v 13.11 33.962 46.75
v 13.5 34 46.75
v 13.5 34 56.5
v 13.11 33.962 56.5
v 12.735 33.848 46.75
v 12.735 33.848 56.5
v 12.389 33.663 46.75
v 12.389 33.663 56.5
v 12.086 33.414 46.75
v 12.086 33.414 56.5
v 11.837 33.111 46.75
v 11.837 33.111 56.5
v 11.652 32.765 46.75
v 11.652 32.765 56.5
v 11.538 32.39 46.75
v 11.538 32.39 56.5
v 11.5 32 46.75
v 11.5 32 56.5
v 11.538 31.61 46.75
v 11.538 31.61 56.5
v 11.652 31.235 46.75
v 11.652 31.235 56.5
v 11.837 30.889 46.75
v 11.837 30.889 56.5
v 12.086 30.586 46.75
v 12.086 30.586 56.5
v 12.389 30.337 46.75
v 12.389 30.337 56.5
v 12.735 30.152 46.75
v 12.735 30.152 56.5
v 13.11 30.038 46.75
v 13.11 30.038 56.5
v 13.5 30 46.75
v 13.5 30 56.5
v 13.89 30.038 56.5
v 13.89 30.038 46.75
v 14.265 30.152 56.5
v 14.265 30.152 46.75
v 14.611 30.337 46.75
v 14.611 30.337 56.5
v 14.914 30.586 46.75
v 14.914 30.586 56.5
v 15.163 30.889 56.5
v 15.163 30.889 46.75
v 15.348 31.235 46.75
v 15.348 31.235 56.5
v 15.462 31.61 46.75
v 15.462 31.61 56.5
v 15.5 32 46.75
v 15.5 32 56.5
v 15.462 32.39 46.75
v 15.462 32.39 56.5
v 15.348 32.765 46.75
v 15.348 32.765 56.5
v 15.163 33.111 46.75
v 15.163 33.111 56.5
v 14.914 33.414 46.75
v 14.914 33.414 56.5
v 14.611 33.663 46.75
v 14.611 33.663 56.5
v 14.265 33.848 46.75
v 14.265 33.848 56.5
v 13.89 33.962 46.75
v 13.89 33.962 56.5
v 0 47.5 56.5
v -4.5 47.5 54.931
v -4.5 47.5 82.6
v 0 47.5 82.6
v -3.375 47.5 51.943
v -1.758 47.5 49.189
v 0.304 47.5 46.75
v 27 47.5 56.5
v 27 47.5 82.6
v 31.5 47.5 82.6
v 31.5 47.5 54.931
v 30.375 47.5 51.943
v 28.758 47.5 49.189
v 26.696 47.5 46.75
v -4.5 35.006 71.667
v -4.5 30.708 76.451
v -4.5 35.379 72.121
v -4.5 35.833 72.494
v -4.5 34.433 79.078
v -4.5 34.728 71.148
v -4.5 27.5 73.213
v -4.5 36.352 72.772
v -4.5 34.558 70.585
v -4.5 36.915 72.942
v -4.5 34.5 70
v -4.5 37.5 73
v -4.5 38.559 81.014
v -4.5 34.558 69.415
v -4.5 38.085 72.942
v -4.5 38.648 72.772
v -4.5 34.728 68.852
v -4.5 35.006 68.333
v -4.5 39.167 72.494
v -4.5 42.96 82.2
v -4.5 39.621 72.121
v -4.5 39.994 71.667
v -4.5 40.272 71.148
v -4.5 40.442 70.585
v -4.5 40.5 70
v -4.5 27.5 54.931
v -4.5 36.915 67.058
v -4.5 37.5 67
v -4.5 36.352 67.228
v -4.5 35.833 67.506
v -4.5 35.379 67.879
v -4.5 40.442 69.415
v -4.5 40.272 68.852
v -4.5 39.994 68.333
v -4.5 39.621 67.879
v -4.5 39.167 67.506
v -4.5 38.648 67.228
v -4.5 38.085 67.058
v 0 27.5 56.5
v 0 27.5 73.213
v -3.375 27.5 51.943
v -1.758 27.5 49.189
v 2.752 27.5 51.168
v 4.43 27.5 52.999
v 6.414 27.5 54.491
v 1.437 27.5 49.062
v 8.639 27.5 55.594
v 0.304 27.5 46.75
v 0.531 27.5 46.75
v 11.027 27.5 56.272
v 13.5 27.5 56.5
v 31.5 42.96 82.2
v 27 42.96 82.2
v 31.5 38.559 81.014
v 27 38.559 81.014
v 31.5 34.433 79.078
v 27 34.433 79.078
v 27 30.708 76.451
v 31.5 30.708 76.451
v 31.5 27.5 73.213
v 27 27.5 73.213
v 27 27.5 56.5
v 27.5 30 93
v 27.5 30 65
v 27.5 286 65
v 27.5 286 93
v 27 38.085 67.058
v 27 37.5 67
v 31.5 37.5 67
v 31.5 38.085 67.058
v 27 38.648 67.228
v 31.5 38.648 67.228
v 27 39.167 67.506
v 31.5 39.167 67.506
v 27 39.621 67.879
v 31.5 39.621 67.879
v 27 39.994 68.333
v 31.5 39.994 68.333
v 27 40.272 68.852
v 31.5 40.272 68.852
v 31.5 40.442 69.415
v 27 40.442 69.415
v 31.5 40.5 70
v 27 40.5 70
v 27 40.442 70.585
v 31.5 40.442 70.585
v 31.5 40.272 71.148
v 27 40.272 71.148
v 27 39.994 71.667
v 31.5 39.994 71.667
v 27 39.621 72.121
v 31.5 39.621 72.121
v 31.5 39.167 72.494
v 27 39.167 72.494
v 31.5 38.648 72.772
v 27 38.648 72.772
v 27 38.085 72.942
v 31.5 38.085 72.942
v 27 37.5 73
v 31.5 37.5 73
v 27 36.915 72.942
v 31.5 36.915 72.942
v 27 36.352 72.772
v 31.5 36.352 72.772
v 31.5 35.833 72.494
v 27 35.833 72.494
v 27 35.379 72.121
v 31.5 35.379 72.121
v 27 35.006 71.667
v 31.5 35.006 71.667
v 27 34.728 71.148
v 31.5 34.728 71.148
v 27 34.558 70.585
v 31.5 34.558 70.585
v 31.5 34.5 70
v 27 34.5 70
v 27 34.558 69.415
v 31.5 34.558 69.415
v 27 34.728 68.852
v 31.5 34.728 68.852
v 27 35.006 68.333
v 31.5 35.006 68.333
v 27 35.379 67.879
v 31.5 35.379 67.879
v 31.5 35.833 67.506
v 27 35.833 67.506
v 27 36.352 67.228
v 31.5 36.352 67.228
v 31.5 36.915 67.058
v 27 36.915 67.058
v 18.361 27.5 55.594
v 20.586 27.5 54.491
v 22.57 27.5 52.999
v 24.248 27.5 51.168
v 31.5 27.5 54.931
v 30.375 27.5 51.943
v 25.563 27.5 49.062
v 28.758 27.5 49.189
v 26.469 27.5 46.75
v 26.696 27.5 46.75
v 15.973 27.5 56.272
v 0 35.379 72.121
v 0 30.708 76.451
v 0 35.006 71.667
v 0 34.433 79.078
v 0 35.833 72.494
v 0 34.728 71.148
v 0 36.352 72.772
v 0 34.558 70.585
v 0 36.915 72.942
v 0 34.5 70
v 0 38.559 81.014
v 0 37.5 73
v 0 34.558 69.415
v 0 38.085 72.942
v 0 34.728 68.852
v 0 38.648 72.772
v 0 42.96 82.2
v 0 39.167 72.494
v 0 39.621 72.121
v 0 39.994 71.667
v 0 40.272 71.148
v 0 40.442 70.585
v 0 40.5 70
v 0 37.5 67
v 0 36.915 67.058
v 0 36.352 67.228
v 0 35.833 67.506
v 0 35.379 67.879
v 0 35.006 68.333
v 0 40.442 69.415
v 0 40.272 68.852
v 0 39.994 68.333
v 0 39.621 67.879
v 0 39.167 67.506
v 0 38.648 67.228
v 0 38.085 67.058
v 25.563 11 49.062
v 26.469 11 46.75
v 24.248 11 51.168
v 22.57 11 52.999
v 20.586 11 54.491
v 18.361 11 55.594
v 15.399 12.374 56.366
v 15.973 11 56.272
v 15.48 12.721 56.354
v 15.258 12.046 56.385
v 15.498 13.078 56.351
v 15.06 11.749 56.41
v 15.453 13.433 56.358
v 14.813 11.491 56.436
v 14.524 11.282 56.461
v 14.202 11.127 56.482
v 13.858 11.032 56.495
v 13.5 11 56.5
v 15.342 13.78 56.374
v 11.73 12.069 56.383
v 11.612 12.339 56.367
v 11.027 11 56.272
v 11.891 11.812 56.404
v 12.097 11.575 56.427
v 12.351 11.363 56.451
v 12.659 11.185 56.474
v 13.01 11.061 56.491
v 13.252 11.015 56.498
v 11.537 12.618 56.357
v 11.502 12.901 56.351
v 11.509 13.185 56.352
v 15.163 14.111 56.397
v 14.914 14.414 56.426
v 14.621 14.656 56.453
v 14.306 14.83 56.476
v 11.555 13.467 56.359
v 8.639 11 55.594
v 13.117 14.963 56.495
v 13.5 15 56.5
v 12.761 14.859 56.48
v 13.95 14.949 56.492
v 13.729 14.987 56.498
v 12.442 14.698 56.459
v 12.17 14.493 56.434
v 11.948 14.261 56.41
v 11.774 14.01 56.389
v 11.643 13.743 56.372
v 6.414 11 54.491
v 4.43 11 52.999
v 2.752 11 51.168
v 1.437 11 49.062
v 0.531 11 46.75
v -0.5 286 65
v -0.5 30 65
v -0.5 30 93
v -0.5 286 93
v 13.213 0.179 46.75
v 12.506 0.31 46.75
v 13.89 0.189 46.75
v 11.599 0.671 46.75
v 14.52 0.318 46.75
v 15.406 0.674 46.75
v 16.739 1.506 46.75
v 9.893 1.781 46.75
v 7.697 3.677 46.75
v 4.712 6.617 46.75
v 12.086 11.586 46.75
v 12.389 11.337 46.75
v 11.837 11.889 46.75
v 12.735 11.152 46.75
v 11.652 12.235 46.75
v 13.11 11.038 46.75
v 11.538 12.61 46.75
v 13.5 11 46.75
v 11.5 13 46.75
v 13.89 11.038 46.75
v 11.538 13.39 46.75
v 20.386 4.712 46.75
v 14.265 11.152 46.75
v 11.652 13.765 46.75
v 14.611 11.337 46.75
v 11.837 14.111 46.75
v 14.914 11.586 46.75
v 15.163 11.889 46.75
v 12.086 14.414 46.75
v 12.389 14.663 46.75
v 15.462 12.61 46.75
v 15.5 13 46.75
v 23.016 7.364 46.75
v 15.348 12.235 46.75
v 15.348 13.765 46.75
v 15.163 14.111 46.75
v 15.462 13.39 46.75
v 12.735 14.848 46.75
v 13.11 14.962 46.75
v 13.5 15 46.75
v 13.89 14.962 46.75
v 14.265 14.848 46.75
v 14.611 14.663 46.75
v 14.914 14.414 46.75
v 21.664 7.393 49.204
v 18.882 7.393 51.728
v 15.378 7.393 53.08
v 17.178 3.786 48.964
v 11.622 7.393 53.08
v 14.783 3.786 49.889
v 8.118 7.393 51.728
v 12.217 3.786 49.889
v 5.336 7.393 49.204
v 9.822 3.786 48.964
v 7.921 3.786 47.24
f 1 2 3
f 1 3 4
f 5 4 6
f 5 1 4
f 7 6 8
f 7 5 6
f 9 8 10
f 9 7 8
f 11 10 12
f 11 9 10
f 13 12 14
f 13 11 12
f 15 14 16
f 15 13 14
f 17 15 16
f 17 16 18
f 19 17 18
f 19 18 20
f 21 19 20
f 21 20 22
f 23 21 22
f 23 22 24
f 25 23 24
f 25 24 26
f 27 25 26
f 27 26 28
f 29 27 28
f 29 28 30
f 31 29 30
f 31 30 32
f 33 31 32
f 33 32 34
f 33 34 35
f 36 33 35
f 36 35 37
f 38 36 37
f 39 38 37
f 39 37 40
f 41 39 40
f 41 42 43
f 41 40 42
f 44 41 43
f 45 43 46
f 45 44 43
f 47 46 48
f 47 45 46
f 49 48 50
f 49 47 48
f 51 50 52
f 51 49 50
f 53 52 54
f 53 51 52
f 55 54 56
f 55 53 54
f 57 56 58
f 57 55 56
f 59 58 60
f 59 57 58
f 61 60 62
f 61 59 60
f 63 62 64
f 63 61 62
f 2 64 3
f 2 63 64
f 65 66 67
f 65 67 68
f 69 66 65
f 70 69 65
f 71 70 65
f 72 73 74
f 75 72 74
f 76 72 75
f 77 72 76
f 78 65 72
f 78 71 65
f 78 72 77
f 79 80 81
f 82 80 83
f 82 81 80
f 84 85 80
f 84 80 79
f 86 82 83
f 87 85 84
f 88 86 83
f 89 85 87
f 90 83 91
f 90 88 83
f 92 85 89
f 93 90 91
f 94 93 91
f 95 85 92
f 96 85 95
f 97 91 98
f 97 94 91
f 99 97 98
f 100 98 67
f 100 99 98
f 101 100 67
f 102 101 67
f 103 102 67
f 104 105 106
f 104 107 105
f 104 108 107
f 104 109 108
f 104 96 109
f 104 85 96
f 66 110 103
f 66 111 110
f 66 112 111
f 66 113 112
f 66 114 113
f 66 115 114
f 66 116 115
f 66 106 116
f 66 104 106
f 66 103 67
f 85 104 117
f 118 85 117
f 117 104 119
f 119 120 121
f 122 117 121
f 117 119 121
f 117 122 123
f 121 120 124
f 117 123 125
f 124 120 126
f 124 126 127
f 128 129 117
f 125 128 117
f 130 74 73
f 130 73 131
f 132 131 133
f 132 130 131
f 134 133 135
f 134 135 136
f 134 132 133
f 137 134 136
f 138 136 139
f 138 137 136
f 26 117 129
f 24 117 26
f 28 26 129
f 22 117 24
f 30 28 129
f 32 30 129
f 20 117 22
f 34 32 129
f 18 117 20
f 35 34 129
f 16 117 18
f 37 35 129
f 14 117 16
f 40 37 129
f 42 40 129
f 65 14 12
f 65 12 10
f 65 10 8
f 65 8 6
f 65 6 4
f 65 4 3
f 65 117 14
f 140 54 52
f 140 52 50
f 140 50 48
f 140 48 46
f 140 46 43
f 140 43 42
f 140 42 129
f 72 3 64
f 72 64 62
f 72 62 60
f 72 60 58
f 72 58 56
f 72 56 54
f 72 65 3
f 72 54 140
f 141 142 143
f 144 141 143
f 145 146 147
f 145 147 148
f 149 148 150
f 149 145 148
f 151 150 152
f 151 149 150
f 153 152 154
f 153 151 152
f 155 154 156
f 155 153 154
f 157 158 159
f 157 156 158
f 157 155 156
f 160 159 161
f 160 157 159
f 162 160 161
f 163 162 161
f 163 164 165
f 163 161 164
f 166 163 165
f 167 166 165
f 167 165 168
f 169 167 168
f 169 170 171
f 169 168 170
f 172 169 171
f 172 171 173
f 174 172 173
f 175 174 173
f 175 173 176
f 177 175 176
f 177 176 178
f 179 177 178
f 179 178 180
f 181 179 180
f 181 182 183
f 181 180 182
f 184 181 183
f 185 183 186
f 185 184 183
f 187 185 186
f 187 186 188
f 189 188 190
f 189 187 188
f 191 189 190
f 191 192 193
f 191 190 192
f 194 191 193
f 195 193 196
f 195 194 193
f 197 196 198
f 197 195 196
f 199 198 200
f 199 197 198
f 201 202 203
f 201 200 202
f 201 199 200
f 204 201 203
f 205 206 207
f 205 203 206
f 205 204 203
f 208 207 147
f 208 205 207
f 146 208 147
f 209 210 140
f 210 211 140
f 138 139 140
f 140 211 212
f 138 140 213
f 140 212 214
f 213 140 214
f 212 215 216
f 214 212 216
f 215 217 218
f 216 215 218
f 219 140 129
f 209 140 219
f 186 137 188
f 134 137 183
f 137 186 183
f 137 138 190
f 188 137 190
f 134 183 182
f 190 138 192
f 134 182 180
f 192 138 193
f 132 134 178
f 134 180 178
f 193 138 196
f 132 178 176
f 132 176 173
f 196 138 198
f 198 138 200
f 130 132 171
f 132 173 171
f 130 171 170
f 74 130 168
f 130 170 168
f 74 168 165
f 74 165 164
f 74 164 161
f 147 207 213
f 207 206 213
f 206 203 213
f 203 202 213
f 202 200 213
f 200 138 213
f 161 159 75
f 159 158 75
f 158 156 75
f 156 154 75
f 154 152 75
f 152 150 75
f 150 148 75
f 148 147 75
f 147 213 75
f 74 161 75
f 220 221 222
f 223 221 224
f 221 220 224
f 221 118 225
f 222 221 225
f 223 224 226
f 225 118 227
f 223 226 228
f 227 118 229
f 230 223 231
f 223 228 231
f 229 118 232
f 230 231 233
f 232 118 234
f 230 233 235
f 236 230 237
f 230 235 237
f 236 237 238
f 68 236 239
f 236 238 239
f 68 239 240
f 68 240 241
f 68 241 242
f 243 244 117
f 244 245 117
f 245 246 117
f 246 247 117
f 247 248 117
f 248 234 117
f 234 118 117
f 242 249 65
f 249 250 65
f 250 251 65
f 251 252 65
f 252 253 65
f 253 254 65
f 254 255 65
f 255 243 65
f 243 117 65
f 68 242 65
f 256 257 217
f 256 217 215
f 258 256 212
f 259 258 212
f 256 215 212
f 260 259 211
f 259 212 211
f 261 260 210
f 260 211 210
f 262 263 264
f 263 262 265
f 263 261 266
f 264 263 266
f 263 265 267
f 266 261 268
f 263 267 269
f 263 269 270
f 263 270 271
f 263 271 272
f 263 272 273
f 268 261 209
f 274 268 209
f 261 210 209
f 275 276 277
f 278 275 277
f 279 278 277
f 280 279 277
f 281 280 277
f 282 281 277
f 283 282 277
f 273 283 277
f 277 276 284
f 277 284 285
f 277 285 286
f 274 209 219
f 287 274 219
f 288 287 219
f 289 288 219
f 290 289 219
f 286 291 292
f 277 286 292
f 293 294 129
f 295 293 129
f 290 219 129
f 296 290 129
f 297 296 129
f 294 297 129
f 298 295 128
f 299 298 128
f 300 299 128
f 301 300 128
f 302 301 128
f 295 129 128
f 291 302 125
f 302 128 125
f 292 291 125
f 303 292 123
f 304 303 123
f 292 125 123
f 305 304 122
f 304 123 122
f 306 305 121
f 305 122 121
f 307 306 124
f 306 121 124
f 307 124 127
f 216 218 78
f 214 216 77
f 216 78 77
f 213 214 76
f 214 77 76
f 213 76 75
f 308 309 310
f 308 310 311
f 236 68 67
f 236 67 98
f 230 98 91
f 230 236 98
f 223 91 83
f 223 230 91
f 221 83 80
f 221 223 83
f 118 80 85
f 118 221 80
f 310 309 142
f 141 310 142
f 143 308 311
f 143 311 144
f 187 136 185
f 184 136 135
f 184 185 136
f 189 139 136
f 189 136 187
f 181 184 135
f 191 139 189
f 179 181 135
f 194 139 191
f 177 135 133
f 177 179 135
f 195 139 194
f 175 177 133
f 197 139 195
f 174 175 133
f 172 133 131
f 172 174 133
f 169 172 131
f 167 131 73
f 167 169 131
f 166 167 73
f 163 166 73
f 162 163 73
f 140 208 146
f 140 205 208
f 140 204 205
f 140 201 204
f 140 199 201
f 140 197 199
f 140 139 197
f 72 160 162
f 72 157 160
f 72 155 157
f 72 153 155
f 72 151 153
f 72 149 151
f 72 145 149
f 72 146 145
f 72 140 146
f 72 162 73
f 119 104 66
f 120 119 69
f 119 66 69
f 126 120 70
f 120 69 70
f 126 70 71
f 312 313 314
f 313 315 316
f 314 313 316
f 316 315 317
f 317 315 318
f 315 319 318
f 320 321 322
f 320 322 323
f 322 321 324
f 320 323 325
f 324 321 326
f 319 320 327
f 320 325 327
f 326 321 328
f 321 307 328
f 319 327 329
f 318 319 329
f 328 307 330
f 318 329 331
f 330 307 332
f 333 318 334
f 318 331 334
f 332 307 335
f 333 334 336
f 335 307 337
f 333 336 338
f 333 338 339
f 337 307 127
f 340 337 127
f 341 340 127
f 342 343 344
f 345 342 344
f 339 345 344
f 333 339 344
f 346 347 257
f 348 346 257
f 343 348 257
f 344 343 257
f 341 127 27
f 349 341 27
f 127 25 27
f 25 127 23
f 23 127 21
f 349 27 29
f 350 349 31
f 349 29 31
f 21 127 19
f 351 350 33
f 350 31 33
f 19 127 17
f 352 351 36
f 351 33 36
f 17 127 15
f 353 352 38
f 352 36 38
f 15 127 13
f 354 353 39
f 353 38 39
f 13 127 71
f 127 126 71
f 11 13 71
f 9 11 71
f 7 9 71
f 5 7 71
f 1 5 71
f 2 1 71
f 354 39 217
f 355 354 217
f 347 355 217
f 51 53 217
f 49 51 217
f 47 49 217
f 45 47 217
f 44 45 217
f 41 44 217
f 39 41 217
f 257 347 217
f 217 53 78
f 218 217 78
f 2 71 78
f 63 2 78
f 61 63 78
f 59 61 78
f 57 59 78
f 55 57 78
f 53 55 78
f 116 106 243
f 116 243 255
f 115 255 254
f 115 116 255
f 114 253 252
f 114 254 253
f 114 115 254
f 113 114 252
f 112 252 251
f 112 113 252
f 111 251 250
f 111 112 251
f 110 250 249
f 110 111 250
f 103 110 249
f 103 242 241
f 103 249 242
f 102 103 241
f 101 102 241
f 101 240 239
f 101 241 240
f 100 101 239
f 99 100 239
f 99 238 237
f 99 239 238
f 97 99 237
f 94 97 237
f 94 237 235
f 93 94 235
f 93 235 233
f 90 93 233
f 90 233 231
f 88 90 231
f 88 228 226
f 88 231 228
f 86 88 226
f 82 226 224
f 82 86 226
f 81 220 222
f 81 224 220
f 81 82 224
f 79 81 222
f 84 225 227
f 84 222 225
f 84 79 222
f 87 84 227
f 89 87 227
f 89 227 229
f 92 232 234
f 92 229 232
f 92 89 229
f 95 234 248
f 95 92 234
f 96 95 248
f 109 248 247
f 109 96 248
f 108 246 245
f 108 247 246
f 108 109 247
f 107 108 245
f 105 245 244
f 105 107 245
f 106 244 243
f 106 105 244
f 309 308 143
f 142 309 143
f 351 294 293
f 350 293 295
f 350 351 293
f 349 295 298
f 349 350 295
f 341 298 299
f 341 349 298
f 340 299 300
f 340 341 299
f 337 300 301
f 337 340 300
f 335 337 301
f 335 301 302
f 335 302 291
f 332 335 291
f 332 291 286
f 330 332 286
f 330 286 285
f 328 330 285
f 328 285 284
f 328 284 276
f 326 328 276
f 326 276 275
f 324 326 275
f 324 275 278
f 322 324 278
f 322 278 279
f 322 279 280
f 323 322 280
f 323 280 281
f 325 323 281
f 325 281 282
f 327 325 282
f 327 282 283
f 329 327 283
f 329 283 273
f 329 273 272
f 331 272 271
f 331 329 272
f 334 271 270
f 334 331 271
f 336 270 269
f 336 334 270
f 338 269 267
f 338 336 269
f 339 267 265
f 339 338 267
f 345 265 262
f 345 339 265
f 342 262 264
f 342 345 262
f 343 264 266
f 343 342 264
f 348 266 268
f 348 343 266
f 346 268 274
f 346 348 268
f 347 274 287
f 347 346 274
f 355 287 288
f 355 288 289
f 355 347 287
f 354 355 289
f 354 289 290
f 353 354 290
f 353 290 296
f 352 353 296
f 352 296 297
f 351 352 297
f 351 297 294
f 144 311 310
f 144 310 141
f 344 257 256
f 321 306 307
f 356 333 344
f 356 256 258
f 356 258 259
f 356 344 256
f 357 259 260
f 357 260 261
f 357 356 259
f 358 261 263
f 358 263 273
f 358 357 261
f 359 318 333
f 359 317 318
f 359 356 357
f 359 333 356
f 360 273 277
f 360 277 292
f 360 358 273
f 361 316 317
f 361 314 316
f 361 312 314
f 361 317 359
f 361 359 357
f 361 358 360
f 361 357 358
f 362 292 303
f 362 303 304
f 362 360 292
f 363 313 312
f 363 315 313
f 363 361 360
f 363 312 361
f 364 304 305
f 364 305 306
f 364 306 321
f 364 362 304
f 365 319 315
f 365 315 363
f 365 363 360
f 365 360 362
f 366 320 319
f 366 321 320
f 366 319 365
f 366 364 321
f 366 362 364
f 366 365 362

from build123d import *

# Parameters (mm, degrees)
BOX_W             = 28
BOX_H             = 256
BOX_DEPTH         = 28
CYLINDER017_W     = 26
CYLINDER017_H     = 38
CYLINDER017_ANGLE = 180
CYLINDER016_R     = 18.7
CYLINDER016_DEPTH = 66
BOX019_W          = 40
BOX019_H          = 20
BOX019_DEPTH      = 13
CYLINDER015_R     = 2
CYLINDER015_DEPTH = 12
CYLINDER011_R     = 2
CYLINDER011_DEPTH = 12
CYLINDER009_R     = 3
CYLINDER009_DEPTH = 100
BOX018_W          = 27
BOX018_H          = 254
BOX018_DEPTH      = 28.5
BOX015_W          = 36
BOX015_H          = 20
BOX015_DEPTH      = 36
BOX016_W          = 27
BOX016_H          = 75
BOX016_DEPTH      = 20
CONE_ANGLE        = 180
CYLINDER_R        = 13.5
CYLINDER_DEPTH    = 19


with BuildPart() as tslotframecut:
    # Box → Box (new body)
    with BuildSketch(Plane(origin=(-0.5, 30, 65), x_dir=(1, 0, 0), z_dir=(0, 0, 1))):
        with Locations((14, 128)):
            Rectangle(BOX_W, BOX_H)
    extrude(amount=BOX_DEPTH)


with BuildPart() as cylinder017:
    # Cylinder017 → Cylinder017 (revolve)
    with BuildSketch(Plane(origin=(-6, 47.5, 56.6), x_dir=(0, 1, 0), z_dir=(0, 0, -1))):
        with Locations((13, 19)):
            Rectangle(CYLINDER017_W, CYLINDER017_H)
    revolve(axis=Axis((-6, 47.5, 56.6), (1, 0, 0)), revolution_arc=CYLINDER017_ANGLE)


with BuildPart() as reshapes:
    # Cylinder016 → Cylinder016 (new body)
    with BuildSketch(Plane(origin=(13.5, 47.5, 60), x_dir=(1, 0, 0), z_dir=(0, -1, 0))):
        Circle(CYLINDER016_R)
    extrude(amount=CYLINDER016_DEPTH)


with BuildPart() as fusion004:
    # Box019 → Box019 (new body)
    with BuildSketch(Plane(origin=(-6.5, 27.5, 60), x_dir=(1, 0, 0), z_dir=(0, 0, 1))):
        with Locations((20, 10)):
            Rectangle(BOX019_W, BOX019_H)
    extrude(amount=BOX019_DEPTH)

    # Fusion003: union reshapes
    add(reshapes.part)

    # Fusion004: union Cylinder017
    add(cylinder017.part)


with BuildPart() as cylinder015:
    # Cylinder015 → Cylinder015 (new body)
    with BuildSketch(Plane(origin=(13.5, 13, 45), x_dir=(0, 1, 0), z_dir=(0, 0, 1))):
        Circle(CYLINDER015_R)
    extrude(amount=CYLINDER015_DEPTH)


with BuildPart() as heatsetcuts:
    # Cylinder011 → Cylinder011 (new body)
    with BuildSketch(Plane(origin=(13.5, 32, 45), x_dir=(0, 1, 0), z_dir=(0, 0, 1))):
        Circle(CYLINDER011_R)
    extrude(amount=CYLINDER011_DEPTH)

    # Fusion001: union Cylinder015
    add(cylinder015.part)


with BuildPart() as m5cut:
    # Cylinder009 → Cylinder009 (new body)
    with BuildSketch(Plane(origin=(-56.4, 37.5, 70), x_dir=(0, 0, -1), z_dir=(1, 0, 0))):
        Circle(CYLINDER009_R)
    extrude(amount=CYLINDER009_DEPTH)


with BuildPart() as tslotframecut001:
    # Box018 → Box018 (new body)
    with BuildSketch(Plane.XY.offset(56.5)):
        with Locations((13.5, 127)):
            Rectangle(BOX018_W, BOX018_H)
    extrude(amount=BOX018_DEPTH)


with BuildPart() as cut010:
    # Box015 → Box015 (new body)
    with BuildSketch(Plane(origin=(-4.5, 27.5, 46.75), x_dir=(1, 0, 0), z_dir=(0, 0, 1))):
        with Locations((18, 10)):
            Rectangle(BOX015_W, BOX015_H)
    extrude(amount=BOX015_DEPTH)

    # Cut009: cut TSlotFrameCut001
    add(tslotframecut001.part, mode=Mode.SUBTRACT)

    # Cut010: cut m5Cut
    add(m5cut.part, mode=Mode.SUBTRACT)


with BuildPart() as shell_holder002:
    # Box016 → Box016 (new body)
    with BuildSketch(Plane(origin=(0, -20.5, 26.75), x_dir=(1, 0, 0), z_dir=(0, 0, 1))):
        with Locations((13.5, 37.5)):
            Rectangle(BOX016_W, BOX016_H)
    extrude(amount=BOX016_DEPTH)


with BuildPart() as cone:
    # Cone → Cone (revolve)
    with BuildSketch(Plane(origin=(13.5, 11, 43), x_dir=(1, 0, 0), z_dir=(0, 0, -1))):
        Polygon((0, 0), (13.5, 0), (0, 15), align=None)
    revolve(axis=Axis((13.5, 11, 43), (0, -1, 0)), revolution_arc=CONE_ANGLE)


with BuildPart() as base001:
    # Cylinder → Cylinder (new body)
    with BuildSketch(Plane(origin=(13.5, 30, 43), x_dir=(-1, 0, 0), z_dir=(0, -1, 0))):
        Circle(CYLINDER_R)
    extrude(amount=CYLINDER_DEPTH)

    # Fusion: union Cone
    add(cone.part)

    # Cut: cut Shell_Holder002
    add(shell_holder002.part, mode=Mode.SUBTRACT)

    # Fusion002: union Cut010
    add(cut010.part)

    # Cut011: cut heatSetCuts
    add(heatsetcuts.part, mode=Mode.SUBTRACT)

    # Common: intersect Fusion004
    add(fusion004.part, mode=Mode.INTERSECT)


solid = Compound([tslotframecut.part, base001.part])
